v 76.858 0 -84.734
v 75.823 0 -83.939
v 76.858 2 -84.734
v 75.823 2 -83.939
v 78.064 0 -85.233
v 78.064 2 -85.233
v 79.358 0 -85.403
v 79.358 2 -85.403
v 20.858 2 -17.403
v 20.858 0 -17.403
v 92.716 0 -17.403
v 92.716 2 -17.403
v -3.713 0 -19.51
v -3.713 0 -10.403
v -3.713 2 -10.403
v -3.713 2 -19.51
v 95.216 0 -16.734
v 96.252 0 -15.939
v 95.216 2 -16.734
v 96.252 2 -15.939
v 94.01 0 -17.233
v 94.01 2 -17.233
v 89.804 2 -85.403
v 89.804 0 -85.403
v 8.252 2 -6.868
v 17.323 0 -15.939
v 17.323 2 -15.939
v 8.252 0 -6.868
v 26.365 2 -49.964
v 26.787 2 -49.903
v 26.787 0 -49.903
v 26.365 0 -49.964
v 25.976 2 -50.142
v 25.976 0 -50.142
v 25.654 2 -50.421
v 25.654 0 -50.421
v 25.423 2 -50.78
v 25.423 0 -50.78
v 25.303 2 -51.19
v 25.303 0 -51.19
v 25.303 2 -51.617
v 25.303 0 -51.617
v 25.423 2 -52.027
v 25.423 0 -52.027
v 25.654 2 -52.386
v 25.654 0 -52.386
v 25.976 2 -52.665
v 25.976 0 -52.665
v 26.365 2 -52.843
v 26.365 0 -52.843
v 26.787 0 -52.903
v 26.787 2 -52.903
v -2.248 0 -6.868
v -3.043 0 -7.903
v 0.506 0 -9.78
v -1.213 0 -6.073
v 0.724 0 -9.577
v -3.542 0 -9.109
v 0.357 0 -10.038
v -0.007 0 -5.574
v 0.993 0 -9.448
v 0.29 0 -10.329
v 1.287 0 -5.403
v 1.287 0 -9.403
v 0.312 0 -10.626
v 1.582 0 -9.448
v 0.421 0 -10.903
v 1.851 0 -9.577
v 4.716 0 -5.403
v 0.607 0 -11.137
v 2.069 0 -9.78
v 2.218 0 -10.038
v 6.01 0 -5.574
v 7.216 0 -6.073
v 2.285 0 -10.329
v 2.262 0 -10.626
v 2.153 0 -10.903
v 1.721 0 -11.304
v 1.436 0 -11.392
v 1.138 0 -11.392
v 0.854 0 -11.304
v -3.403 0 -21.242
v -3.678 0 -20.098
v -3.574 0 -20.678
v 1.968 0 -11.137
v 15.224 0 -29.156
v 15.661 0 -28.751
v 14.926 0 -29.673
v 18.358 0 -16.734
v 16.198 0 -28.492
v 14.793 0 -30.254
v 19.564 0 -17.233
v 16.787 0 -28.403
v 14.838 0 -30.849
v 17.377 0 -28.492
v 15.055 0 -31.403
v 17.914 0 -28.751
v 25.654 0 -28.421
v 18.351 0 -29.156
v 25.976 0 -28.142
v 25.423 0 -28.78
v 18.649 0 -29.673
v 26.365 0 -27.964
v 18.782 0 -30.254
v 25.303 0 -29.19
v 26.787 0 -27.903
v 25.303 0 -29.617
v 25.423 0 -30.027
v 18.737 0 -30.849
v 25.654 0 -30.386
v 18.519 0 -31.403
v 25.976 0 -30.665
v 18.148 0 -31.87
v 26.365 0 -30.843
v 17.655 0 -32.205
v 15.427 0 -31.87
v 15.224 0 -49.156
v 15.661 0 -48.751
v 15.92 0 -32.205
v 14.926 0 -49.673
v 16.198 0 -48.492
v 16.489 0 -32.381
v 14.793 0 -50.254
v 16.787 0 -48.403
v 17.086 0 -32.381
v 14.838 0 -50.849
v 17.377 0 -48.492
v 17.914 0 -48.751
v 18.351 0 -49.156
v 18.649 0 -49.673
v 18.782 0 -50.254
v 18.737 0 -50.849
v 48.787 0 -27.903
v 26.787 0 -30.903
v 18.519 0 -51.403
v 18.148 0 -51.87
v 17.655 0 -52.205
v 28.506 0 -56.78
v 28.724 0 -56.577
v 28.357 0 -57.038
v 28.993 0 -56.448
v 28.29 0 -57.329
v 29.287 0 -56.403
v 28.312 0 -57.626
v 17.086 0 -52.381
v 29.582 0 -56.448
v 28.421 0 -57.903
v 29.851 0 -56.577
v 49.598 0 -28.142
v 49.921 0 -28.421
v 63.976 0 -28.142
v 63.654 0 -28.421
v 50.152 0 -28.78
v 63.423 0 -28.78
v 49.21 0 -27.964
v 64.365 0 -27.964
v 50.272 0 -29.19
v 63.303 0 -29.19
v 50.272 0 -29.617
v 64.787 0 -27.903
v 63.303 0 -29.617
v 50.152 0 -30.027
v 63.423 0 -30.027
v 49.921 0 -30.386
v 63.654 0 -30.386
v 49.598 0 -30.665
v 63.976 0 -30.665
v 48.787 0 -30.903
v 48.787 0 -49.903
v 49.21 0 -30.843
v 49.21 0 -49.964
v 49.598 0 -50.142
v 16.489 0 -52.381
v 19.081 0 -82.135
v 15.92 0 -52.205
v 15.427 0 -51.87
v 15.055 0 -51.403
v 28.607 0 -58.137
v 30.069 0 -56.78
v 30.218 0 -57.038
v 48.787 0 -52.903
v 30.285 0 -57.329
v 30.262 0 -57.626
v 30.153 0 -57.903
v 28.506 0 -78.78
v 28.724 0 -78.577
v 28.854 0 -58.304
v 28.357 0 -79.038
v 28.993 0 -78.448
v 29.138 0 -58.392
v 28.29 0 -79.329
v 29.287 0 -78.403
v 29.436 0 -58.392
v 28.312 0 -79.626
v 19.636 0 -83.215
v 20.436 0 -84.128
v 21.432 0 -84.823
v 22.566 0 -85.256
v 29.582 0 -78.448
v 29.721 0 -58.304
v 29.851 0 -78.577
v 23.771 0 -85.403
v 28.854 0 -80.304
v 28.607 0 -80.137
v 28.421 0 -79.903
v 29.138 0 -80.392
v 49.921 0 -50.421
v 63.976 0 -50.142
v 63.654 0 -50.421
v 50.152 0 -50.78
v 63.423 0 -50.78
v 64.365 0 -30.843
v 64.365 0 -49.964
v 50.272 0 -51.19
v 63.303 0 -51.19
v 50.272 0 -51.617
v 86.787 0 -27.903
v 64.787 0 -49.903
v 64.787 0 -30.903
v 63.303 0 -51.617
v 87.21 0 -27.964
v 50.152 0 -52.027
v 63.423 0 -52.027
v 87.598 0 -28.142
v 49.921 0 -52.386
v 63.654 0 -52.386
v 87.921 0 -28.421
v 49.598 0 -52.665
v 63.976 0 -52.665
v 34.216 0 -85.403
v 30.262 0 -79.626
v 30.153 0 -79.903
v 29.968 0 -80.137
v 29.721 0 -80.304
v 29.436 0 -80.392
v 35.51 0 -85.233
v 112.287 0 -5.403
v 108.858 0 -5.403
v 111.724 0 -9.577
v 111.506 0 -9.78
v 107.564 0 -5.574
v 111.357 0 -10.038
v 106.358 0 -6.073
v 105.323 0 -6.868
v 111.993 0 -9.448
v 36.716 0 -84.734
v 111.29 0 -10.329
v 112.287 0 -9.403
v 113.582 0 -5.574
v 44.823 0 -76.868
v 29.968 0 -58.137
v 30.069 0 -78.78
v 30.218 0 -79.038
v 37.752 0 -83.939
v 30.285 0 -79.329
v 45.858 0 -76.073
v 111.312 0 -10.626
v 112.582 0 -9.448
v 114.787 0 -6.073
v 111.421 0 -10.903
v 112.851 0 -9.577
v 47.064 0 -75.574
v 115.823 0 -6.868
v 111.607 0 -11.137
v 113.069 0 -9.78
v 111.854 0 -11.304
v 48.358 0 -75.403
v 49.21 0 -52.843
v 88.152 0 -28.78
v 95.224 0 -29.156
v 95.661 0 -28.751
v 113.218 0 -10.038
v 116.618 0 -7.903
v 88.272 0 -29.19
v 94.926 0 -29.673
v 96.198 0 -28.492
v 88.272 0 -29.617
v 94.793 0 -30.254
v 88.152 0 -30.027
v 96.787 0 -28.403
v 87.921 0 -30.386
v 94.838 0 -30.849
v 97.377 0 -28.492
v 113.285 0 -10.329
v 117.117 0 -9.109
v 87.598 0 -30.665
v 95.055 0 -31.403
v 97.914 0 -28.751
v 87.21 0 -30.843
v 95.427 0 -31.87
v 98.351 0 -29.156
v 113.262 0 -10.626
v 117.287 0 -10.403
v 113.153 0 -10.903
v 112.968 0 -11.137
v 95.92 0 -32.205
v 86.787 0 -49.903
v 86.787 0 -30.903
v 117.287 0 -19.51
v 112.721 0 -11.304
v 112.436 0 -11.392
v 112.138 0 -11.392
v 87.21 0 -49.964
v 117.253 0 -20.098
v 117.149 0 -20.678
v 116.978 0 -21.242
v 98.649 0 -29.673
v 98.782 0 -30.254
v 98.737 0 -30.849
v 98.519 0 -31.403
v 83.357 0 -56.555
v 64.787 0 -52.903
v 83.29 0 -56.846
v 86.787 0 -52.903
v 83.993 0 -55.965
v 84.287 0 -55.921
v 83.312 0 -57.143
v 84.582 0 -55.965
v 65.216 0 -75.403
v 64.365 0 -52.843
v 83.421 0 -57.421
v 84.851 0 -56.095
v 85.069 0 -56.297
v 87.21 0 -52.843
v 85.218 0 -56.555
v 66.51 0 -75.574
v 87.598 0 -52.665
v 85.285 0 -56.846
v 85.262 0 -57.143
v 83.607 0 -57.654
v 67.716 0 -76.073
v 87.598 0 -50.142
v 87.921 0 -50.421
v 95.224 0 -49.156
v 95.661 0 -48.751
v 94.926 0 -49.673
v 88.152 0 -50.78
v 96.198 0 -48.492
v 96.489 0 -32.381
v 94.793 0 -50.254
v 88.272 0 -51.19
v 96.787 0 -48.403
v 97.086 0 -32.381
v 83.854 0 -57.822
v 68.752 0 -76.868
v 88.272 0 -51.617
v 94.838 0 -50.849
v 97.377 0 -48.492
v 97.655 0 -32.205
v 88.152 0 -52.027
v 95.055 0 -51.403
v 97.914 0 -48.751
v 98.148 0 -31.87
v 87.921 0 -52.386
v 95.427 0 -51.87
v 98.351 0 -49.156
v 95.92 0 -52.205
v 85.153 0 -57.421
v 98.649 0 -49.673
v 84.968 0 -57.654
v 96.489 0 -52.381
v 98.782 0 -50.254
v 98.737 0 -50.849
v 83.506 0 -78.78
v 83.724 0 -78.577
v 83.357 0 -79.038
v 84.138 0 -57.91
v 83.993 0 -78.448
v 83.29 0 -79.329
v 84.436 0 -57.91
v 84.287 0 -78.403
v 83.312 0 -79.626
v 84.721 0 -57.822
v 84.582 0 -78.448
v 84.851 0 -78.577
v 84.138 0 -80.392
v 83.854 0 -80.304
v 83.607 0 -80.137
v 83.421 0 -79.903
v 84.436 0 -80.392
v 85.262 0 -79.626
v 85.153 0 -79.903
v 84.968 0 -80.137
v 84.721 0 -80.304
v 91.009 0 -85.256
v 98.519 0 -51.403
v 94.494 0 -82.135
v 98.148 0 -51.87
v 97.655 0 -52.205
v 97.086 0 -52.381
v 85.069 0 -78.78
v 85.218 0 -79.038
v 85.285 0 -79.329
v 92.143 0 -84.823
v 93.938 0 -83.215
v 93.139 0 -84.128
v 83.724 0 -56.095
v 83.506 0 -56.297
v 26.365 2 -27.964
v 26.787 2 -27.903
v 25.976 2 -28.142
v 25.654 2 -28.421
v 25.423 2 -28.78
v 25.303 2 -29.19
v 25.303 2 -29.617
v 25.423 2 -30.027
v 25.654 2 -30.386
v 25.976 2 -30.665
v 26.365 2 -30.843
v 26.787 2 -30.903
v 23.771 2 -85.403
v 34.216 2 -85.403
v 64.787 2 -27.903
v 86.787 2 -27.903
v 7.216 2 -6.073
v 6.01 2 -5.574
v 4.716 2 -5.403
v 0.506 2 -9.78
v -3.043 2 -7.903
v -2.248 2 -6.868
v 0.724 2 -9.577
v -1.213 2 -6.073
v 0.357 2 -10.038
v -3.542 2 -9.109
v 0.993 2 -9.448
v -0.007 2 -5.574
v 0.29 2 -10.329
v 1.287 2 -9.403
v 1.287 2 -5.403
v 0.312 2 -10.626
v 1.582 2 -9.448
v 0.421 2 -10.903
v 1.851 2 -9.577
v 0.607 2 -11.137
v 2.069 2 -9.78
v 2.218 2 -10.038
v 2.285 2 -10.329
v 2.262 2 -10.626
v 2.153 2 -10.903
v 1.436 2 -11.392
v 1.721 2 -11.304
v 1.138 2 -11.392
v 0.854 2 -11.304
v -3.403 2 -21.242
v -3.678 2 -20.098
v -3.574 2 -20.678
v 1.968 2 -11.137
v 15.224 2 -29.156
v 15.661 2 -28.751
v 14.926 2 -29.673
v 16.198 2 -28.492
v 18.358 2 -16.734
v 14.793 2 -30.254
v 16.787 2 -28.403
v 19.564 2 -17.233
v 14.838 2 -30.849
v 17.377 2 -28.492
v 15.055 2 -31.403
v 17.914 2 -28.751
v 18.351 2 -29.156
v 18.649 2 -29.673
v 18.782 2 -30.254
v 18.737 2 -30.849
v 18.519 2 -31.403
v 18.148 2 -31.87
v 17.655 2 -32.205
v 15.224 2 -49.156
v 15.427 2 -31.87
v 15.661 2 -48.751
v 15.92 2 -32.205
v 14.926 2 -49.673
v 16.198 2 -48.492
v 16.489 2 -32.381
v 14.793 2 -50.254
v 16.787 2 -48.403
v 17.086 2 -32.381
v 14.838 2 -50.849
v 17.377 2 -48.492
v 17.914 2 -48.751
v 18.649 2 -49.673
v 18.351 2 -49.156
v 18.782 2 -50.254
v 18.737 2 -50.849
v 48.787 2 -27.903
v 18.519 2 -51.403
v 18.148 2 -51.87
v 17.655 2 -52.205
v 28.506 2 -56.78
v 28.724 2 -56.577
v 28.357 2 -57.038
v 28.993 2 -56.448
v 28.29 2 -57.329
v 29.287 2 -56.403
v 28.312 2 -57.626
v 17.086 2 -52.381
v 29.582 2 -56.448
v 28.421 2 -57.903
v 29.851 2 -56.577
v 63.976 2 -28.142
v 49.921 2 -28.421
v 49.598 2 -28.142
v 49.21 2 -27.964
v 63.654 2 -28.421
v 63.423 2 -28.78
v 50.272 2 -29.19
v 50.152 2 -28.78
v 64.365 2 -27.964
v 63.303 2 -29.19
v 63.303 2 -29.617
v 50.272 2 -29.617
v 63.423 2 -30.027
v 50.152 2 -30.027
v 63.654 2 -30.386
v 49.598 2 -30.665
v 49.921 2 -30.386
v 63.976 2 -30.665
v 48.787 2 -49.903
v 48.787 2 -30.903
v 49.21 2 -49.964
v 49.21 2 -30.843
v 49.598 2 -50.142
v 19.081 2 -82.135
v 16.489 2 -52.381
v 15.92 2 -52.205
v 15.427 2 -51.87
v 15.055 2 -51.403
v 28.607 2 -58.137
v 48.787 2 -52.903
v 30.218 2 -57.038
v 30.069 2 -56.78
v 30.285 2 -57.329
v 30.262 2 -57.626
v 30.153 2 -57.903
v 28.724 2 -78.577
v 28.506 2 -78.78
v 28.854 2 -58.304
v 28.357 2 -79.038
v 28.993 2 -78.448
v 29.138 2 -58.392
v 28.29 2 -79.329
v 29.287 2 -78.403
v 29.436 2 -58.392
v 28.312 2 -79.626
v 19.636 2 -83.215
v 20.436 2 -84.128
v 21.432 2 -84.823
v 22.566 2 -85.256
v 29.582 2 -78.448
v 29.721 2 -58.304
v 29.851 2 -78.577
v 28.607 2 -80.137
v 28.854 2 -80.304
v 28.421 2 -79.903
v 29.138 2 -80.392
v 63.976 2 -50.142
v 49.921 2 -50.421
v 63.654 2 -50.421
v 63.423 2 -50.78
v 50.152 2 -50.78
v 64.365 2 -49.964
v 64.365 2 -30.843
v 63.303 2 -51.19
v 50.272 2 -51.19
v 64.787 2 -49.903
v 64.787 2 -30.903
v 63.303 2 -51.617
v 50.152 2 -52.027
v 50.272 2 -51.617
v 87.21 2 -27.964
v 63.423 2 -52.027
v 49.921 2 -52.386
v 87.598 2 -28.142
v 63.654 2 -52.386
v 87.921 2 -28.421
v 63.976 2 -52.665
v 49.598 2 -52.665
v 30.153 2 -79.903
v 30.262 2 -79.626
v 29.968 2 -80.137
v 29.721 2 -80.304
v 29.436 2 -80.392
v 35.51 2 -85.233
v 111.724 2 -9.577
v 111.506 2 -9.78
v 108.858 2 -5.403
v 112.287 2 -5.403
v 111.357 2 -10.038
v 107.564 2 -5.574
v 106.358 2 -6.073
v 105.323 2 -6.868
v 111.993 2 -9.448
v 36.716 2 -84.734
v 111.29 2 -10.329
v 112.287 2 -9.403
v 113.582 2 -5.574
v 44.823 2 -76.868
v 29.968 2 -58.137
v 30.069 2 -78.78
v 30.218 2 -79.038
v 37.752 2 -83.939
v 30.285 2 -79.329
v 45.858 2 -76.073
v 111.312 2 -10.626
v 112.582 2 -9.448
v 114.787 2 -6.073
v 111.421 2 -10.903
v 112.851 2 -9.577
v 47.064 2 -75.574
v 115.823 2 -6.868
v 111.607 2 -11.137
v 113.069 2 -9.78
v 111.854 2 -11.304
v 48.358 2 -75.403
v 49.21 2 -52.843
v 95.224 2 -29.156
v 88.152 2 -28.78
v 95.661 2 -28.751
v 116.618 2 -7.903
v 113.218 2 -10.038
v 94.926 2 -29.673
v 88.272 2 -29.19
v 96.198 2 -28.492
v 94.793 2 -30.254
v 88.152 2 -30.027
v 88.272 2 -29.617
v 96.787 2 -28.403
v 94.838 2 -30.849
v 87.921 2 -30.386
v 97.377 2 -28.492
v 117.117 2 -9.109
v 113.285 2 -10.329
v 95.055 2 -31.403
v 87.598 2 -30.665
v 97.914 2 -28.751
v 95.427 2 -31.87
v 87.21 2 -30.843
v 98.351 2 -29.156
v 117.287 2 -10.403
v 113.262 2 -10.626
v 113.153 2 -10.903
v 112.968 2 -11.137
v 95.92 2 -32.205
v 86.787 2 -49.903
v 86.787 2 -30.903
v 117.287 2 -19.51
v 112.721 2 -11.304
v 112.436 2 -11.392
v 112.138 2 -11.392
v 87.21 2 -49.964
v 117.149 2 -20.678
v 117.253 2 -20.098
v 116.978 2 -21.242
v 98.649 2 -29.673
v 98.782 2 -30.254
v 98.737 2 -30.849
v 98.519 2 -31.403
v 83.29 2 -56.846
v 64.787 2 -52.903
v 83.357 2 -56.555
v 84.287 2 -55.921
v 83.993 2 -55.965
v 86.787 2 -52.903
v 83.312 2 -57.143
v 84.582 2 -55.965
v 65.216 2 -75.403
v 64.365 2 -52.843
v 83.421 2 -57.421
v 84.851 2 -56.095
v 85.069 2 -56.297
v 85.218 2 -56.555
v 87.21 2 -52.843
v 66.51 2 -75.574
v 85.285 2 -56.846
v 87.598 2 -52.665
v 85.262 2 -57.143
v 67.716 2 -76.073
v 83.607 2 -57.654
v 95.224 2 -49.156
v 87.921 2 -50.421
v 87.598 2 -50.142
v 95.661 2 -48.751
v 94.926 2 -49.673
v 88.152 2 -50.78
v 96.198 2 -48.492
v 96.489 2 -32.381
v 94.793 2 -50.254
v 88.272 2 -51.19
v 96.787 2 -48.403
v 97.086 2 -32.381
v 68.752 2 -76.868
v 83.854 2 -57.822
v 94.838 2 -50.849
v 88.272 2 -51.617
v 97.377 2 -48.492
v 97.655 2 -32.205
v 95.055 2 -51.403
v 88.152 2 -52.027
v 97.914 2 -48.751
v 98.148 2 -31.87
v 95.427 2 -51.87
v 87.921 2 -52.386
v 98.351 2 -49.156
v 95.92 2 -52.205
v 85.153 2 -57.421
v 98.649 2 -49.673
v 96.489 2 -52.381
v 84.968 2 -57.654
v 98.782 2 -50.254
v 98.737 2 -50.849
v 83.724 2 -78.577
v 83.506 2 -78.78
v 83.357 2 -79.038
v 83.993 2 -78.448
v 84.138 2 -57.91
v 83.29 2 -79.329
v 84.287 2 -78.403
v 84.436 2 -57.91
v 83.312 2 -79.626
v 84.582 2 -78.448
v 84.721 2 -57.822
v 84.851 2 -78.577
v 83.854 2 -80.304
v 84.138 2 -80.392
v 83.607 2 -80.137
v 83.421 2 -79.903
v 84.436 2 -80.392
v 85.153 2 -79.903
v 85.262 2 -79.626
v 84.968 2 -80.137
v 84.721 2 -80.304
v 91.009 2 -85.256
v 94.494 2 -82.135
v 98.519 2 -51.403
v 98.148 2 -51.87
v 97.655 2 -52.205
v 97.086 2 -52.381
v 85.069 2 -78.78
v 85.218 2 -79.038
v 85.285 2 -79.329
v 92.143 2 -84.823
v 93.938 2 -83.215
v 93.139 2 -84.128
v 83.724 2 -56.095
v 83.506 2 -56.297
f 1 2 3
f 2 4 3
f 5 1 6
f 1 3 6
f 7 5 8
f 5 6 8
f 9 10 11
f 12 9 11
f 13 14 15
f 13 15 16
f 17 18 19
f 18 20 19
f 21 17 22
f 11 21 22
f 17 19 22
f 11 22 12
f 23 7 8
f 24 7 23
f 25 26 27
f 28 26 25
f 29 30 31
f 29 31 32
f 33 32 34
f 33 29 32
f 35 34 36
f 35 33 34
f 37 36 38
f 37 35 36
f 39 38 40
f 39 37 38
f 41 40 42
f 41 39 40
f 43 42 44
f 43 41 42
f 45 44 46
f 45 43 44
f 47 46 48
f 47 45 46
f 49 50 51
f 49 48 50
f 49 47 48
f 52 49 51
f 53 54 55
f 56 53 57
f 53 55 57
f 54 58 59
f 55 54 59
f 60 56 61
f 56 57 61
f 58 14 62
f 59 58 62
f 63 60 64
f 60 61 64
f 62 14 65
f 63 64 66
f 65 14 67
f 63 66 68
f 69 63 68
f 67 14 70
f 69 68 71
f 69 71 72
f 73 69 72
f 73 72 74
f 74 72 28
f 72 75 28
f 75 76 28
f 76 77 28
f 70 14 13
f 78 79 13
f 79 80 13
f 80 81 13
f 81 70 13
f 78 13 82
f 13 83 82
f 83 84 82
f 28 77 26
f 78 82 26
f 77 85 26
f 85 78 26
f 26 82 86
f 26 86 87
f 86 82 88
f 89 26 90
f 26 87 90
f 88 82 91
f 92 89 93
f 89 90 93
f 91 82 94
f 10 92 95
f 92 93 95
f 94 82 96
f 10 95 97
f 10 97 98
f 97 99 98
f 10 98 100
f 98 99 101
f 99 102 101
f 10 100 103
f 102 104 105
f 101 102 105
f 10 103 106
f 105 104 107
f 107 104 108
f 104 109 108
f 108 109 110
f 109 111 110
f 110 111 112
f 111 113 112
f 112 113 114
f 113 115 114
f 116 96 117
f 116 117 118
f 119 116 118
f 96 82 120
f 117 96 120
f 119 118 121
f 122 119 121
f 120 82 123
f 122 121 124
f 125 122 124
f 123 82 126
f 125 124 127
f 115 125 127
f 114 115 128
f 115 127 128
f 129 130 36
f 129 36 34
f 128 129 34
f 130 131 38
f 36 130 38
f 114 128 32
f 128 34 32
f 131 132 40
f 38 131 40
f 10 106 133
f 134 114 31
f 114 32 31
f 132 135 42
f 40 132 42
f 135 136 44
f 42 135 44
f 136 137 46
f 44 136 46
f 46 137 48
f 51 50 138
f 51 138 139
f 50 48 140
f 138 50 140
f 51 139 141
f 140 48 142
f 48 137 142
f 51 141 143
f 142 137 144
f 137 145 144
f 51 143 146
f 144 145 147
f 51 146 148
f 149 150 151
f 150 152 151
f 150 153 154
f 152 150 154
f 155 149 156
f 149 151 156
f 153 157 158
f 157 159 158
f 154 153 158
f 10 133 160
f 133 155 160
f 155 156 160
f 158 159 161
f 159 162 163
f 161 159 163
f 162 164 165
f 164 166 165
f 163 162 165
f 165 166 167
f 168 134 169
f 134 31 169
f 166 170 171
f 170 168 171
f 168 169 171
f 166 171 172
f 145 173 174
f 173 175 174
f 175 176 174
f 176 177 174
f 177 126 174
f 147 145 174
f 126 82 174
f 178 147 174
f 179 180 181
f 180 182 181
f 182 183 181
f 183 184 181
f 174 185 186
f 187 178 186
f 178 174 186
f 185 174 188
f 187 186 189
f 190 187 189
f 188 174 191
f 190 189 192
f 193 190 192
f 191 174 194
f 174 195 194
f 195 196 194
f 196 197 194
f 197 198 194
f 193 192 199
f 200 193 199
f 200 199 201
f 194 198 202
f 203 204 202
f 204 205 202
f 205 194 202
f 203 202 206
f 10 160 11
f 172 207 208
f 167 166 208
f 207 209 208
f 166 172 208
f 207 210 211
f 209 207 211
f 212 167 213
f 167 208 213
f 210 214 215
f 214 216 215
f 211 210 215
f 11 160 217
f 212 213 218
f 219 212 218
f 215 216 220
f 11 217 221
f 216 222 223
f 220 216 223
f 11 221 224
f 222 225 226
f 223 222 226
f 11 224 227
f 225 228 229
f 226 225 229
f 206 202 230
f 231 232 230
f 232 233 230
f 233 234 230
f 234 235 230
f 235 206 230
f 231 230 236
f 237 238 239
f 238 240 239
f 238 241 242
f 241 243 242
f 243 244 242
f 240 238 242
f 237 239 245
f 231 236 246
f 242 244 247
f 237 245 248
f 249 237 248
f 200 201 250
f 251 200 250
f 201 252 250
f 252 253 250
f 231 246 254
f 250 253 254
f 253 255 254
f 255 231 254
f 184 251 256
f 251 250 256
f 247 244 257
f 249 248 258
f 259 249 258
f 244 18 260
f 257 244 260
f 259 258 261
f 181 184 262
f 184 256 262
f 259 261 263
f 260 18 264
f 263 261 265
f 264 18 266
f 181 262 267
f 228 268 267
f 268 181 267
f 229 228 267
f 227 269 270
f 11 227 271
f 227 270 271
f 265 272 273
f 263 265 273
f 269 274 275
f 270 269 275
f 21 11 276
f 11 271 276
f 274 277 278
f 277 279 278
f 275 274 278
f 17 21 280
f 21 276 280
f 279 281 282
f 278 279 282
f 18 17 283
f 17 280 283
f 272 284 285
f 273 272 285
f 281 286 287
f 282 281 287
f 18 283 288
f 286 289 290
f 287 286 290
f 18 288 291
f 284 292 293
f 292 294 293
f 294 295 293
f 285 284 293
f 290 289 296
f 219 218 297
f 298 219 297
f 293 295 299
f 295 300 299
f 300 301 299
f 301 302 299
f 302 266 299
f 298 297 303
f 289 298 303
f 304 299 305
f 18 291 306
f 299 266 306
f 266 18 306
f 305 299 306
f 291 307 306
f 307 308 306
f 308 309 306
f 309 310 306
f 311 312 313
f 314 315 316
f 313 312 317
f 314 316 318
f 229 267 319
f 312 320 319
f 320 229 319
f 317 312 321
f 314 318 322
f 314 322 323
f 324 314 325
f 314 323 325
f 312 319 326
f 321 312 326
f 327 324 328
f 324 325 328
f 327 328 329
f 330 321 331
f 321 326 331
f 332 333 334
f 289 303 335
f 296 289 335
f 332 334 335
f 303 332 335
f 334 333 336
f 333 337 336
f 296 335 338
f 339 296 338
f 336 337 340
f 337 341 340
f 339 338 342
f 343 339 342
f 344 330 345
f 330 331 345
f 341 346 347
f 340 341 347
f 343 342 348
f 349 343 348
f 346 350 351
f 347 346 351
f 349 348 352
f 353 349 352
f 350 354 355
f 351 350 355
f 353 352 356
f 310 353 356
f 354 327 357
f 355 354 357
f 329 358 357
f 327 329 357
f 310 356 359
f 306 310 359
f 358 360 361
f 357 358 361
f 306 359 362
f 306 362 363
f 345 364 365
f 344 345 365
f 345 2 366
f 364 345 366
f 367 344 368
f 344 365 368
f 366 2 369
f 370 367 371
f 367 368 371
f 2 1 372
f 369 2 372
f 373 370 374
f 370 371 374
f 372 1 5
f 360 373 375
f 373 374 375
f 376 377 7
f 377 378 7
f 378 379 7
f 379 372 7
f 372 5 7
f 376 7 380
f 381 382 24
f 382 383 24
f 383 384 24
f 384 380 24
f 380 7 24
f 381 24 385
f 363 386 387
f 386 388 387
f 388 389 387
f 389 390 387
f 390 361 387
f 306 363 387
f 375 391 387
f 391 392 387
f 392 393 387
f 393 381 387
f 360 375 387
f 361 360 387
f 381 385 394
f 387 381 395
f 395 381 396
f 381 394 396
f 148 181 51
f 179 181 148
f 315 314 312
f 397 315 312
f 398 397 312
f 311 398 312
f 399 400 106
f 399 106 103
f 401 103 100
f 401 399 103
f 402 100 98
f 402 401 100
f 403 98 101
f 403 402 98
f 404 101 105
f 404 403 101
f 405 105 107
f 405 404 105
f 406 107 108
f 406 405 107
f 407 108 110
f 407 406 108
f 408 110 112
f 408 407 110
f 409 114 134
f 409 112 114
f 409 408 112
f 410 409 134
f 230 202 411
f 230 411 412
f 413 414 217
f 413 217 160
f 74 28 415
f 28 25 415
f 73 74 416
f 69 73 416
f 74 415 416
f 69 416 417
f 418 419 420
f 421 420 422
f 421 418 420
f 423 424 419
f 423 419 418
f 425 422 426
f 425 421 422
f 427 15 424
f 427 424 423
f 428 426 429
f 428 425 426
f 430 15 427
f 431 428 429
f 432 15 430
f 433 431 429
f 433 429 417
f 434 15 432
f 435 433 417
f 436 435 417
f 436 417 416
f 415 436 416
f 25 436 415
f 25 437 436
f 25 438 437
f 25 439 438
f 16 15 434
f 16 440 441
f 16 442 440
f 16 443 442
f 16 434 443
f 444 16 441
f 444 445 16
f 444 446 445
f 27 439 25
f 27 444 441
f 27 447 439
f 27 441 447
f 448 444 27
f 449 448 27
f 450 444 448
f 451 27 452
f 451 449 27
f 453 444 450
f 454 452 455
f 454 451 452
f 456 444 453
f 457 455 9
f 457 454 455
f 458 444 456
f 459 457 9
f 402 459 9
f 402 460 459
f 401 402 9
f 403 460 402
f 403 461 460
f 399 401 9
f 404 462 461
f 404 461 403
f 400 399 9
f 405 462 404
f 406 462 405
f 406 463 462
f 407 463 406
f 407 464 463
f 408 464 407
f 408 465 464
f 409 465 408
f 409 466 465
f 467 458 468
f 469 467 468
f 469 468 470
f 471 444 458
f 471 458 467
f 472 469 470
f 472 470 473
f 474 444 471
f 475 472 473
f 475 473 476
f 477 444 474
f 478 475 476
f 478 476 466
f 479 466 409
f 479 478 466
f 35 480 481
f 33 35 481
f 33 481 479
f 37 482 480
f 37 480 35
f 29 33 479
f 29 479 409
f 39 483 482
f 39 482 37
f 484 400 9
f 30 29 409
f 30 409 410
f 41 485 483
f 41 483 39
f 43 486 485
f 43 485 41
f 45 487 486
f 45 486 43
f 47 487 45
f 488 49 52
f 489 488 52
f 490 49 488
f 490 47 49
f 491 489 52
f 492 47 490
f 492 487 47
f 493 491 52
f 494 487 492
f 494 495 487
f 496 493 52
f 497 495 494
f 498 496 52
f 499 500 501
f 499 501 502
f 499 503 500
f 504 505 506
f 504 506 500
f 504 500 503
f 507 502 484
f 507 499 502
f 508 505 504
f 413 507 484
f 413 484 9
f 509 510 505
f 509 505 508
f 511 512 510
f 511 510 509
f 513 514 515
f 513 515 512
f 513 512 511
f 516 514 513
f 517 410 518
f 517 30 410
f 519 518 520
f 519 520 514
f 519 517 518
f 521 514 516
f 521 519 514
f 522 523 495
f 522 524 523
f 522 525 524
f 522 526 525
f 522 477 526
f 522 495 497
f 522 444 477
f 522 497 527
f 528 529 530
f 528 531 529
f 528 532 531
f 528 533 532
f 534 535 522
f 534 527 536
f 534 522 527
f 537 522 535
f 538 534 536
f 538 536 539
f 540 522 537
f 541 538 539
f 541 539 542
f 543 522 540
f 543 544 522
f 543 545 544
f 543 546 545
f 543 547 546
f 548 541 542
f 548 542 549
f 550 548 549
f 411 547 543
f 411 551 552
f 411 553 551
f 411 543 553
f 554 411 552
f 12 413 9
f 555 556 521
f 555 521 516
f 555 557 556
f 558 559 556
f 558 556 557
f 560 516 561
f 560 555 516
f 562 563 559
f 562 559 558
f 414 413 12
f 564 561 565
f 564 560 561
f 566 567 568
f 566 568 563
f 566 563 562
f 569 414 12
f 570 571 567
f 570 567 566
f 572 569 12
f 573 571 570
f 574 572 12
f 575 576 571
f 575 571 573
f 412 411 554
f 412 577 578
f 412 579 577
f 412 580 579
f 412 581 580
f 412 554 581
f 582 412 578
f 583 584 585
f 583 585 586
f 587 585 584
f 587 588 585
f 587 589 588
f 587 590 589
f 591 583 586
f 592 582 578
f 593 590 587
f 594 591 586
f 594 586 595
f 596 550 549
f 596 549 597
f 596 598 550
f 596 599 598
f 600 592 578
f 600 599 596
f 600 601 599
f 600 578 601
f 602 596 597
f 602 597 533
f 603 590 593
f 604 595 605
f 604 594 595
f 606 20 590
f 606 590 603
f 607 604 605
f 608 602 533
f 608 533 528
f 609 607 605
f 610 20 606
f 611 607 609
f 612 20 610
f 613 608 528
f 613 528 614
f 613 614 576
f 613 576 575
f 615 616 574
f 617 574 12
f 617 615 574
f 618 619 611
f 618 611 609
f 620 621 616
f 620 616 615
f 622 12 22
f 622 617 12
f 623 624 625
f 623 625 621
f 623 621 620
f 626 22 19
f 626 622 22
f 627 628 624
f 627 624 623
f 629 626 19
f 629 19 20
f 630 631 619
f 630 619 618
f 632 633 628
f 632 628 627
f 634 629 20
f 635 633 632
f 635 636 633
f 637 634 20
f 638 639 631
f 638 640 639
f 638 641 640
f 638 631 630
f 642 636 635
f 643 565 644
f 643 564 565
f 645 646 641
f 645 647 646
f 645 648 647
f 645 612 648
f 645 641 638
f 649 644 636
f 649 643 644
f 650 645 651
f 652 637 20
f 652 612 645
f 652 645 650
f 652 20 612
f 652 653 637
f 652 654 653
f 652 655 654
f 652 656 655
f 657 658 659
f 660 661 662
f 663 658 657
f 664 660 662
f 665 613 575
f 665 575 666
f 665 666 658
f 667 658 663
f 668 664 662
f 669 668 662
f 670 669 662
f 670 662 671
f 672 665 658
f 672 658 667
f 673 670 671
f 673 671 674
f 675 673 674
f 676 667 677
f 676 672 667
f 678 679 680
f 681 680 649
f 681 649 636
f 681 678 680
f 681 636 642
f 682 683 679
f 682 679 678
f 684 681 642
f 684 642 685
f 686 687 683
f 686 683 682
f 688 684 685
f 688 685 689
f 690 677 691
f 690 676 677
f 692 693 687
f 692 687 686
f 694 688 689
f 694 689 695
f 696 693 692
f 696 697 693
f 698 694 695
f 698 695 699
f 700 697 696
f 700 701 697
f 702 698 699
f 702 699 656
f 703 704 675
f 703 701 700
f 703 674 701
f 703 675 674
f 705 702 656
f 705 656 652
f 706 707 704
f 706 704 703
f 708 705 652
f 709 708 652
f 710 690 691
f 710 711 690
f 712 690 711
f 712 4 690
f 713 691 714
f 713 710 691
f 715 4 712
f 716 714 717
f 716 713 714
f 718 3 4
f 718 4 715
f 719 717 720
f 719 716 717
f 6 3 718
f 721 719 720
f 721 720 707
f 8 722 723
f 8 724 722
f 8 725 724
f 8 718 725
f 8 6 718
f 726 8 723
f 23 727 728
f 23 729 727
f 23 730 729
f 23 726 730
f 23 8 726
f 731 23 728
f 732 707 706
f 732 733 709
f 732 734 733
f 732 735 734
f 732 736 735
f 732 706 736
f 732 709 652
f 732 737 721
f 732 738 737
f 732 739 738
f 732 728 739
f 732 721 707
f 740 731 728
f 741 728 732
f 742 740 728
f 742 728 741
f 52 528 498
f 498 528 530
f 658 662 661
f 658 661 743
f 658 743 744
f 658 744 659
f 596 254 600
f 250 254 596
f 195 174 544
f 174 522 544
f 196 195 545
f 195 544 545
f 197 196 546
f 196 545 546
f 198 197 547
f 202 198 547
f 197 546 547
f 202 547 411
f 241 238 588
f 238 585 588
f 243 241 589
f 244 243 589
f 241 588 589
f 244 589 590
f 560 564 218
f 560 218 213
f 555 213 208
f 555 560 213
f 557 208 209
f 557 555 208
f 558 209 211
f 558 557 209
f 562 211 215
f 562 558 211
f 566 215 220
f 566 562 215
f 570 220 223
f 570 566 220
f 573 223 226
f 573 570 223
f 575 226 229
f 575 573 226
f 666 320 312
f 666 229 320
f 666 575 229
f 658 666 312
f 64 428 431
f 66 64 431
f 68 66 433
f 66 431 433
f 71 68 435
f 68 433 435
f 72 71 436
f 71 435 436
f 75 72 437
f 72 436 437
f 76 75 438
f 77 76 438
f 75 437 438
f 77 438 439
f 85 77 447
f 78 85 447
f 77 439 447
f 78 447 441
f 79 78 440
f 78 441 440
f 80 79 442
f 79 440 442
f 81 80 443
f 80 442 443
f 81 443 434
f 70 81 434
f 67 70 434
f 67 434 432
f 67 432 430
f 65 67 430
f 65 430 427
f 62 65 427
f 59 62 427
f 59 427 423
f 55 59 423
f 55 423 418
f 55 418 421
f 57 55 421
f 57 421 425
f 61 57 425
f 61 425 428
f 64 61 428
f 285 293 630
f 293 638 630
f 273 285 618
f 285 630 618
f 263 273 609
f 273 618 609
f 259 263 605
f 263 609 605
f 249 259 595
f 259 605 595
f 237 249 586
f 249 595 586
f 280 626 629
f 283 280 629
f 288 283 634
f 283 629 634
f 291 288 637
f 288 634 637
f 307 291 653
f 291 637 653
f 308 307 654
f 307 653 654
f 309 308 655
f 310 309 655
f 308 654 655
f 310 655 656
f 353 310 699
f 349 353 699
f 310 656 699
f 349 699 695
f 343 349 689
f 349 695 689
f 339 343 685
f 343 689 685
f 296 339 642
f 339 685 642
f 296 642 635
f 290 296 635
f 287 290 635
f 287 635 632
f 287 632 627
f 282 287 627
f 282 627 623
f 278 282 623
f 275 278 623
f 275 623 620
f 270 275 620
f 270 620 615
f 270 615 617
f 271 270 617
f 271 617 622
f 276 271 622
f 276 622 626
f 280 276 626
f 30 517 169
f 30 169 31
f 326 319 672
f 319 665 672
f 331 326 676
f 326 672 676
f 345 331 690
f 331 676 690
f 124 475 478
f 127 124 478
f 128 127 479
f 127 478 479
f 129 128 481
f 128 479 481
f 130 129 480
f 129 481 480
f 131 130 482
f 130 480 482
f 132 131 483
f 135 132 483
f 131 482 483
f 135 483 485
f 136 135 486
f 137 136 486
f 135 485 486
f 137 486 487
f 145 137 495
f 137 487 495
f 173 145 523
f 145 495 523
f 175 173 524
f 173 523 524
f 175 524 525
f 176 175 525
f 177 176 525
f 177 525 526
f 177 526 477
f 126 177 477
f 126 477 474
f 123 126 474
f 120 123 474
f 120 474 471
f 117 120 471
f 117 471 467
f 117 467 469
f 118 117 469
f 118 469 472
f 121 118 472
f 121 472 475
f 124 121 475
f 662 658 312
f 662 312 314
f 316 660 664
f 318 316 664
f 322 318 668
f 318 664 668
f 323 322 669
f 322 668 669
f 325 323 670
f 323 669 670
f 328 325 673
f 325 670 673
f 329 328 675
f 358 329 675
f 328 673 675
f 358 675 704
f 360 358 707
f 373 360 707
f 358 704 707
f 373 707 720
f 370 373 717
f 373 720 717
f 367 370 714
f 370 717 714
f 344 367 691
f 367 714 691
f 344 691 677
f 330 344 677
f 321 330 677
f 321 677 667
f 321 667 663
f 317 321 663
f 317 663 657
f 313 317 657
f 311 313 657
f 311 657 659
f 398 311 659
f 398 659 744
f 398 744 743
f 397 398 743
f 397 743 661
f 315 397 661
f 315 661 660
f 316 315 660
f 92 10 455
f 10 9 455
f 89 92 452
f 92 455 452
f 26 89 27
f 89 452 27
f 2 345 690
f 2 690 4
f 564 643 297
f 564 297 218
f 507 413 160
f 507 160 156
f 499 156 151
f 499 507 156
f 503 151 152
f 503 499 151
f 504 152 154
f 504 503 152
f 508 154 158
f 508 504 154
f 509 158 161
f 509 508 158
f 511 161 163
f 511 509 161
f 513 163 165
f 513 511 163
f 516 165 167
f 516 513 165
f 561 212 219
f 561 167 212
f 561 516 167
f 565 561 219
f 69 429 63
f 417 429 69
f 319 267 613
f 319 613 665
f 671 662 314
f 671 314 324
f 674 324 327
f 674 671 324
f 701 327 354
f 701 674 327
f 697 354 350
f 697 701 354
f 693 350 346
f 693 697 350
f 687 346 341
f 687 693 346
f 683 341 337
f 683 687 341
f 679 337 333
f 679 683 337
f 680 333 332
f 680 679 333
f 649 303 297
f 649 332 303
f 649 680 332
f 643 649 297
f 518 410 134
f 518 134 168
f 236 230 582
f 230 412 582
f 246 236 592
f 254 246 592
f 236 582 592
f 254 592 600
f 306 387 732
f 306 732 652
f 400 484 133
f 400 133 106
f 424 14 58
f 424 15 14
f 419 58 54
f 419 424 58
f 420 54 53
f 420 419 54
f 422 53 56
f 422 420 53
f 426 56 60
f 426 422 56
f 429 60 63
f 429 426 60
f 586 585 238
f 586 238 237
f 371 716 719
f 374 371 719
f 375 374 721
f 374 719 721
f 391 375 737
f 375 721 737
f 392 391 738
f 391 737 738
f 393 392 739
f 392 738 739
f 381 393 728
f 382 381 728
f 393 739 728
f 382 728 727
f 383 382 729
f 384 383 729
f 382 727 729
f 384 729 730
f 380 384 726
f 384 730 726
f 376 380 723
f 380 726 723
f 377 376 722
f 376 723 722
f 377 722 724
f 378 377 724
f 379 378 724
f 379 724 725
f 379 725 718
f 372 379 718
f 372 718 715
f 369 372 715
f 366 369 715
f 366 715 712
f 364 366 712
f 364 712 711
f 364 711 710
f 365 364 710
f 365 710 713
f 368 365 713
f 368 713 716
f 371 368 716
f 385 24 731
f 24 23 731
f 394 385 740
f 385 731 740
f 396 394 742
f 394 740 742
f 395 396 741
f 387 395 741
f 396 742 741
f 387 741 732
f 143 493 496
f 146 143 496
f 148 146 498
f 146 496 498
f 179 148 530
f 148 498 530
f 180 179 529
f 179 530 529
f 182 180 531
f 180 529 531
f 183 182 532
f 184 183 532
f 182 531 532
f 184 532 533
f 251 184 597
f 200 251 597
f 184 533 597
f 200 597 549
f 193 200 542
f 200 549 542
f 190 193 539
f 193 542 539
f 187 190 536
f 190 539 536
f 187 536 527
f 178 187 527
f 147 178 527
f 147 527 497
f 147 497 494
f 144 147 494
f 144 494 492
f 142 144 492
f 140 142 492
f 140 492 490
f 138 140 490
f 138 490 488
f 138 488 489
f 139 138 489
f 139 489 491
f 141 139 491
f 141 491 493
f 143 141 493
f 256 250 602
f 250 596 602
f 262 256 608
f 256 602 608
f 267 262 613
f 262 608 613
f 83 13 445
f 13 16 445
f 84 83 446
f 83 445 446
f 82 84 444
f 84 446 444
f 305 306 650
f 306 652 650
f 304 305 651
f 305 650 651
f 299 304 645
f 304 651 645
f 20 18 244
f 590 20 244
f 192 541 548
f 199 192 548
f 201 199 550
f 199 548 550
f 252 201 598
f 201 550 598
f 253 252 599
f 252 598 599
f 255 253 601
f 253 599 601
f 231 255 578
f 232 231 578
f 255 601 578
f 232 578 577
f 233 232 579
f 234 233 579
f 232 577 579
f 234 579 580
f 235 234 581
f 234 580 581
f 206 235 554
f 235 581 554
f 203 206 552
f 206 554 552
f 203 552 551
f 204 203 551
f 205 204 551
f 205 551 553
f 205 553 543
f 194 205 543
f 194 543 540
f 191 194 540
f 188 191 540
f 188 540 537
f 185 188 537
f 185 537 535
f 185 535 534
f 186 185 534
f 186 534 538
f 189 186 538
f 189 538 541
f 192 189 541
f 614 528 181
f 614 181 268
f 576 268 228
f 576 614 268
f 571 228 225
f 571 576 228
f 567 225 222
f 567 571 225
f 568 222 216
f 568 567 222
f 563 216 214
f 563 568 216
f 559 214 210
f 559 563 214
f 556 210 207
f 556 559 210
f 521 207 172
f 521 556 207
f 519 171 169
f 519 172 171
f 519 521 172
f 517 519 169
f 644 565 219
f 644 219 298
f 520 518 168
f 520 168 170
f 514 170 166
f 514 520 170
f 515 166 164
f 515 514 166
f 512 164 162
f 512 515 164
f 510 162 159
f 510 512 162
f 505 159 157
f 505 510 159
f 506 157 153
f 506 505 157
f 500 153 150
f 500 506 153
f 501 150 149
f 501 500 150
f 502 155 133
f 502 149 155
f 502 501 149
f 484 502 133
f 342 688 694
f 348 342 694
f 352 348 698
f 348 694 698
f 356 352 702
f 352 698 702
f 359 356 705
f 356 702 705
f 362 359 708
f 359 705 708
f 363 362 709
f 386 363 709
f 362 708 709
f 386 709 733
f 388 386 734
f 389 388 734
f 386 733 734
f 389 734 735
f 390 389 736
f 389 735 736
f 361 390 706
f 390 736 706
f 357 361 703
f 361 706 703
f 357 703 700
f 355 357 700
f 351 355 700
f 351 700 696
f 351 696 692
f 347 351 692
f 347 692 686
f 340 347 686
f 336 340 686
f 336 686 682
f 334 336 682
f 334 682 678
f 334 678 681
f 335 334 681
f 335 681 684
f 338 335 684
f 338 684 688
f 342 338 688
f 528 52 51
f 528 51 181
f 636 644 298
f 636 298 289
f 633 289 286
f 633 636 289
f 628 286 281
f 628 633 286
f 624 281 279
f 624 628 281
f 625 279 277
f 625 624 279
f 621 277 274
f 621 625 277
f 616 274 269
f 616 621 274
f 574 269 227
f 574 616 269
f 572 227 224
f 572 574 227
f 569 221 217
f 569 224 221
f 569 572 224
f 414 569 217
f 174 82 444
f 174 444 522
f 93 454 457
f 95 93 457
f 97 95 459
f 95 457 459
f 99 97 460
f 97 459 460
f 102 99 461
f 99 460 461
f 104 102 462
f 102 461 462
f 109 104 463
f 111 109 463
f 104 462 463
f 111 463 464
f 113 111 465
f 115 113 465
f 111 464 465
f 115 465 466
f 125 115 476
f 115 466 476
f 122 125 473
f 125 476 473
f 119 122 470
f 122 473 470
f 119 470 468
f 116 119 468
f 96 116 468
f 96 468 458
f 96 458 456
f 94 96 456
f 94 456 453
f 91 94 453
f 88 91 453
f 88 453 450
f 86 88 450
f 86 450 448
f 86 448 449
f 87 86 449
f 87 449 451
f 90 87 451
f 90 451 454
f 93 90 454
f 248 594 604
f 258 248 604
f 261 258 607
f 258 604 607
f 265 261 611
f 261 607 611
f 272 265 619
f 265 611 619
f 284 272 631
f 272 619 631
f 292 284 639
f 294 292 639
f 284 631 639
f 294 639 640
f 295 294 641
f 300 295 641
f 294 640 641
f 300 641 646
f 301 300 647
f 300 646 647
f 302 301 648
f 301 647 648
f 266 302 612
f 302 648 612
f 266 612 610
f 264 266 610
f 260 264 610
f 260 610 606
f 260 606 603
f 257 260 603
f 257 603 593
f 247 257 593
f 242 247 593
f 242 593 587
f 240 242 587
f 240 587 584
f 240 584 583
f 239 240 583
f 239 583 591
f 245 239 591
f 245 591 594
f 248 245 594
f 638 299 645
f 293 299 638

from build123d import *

# Parameters (mm, degrees)
SKETCH1_W                = 130
SKETCH1_H                = 90
BOSS_EXTRUDE2_DEPTH      = 2
SKETCH2_R                = 2
CUT_EXTRUDE1_DEPTH       = 10
CUT_EXTRUDE3_DEPTH       = 10
SKETCH5_R                = 1
CUT_EXTRUDE4_DEPTH       = 10
SKETCH7_W                = 130
SKETCH7_H                = 10
CUT_EXTRUDE5_DEPTH       = 10
CUT_EXTRUDE10_DEPTH      = 149.761308663
CUT_EXTRUDE10_DEPTH_BACK = 149.761308663
CUT_EXTRUDE14_DEPTH      = 149.761308663
CUT_EXTRUDE14_DEPTH_BACK = 13
SKETCH12_R               = 1
FILLET2_R                = 5


with BuildPart() as part:
    # Sketch1 → Boss-Extrude2 (new body)
    with BuildSketch(Plane(origin=(0, 0, 0), x_dir=(1, 0, 0), z_dir=(0, 1, 0))):
        with Locations((56.787418592, 40.403463793)):
            Rectangle(SKETCH1_W, SKETCH1_H)
    extrude(amount=BOSS_EXTRUDE2_DEPTH)

    # Sketch2 → Cut-Extrude1 (cut)
    with BuildSketch(Plane(origin=(0, 2, 0), x_dir=(1, 0, 0), z_dir=(0, 1, 0))):
        with Locations(Location((16.787418592, 50.403463793, 0), (0, 0, 270))):
            Circle(SKETCH2_R)
        with Locations(Location((16.787418592, 30.403463793, 0), (0, 0, 270))):
            Circle(SKETCH2_R)
        with Locations(Location((96.787418592, 50.403463793, 0), (0, 0, 270))):
            Circle(SKETCH2_R)
        with Locations(Location((96.787418592, 30.403463793, 0), (0, 0, 270))):
            Circle(SKETCH2_R)
    extrude(amount=-CUT_EXTRUDE1_DEPTH, mode=Mode.SUBTRACT)

    # Sketch4 → Cut-Extrude3 (cut)
    with BuildSketch(Plane(origin=(0, 2, 0), x_dir=(1, 0, 0), z_dir=(0, 1, 0))):
        with BuildLine():
            Line((26.787418592, 52.903463793), (48.787418592, 52.903463793))
            ThreePointArc((48.787418592, 52.903463793), (50.287418592, 51.403463793), (48.787418592, 49.903463793))
            Line((48.787418592, 49.903463793), (26.787418592, 49.903463793))
            ThreePointArc((26.787418592, 49.903463793), (25.287418592, 51.403463793), (26.787418592, 52.903463793))
        make_face()
        with BuildLine():
            Line((26.787418592, 30.903463793), (48.787418592, 30.903463793))
            ThreePointArc((48.787418592, 30.903463793), (50.287418592, 29.403463793), (48.787418592, 27.903463793))
            Line((48.787418592, 27.903463793), (26.787418592, 27.903463793))
            ThreePointArc((26.787418592, 27.903463793), (25.287418592, 29.403463793), (26.787418592, 30.903463793))
        make_face()
        with BuildLine():
            Line((64.787418592, 52.903463793), (86.787418592, 52.903463793))
            ThreePointArc((86.787418592, 52.903463793), (88.287418592, 51.403463793), (86.787418592, 49.903463793))
            Line((86.787418592, 49.903463793), (64.787418592, 49.903463793))
            ThreePointArc((64.787418592, 49.903463793), (63.287418592, 51.403463793), (64.787418592, 52.903463793))
        make_face()
        with BuildLine():
            Line((64.787418592, 30.903463793), (86.787418592, 30.903463793))
            ThreePointArc((86.787418592, 30.903463793), (88.287418592, 29.403463793), (86.787418592, 27.903463793))
            Line((86.787418592, 27.903463793), (64.787418592, 27.903463793))
            ThreePointArc((64.787418592, 27.903463793), (63.287418592, 29.403463793), (64.787418592, 30.903463793))
        make_face()
    extrude(amount=-CUT_EXTRUDE3_DEPTH, mode=Mode.SUBTRACT)

    # Sketch5 → Cut-Extrude4 (cut)
    with BuildSketch(Plane(origin=(0, 2, 0), x_dir=(1, 0, 0), z_dir=(0, 1, 0))):
        with Locations(Location((1.287418592, 10.403463793, 0), (0, 0, 270))):
            Circle(SKETCH5_R)
        with Locations(Location((112.287418592, 10.403463793, 0), (0, 0, 270))):
            Circle(SKETCH5_R)
        with Locations(Location((84.287418592, 56.920801797, 0), (0, 0, 270))):
            Circle(SKETCH5_R)
        with Locations(Location((116.787418592, 57.403463793, 0), (0, 0, 270))):
            Circle(SKETCH5_R)
        with Locations(Location((116.787418592, 79.403463793, 0), (0, 0, 270))):
            Circle(SKETCH5_R)
        with Locations(Location((84.287418592, 79.403463793, 0), (0, 0, 270))):
            Circle(SKETCH5_R)
        with Locations(Location((-3.212581408, 57.403463793, 0), (0, 0, 270))):
            Circle(SKETCH5_R)
        with Locations(Location((29.287418592, 57.403463793, 0), (0, 0, 270))):
            Circle(SKETCH5_R)
        with Locations(Location((29.287418592, 79.403463793, 0), (0, 0, 270))):
            Circle(SKETCH5_R)
        with Locations(Location((-3.212581408, 79.403463793, 0), (0, 0, 270))):
            Circle(SKETCH5_R)
    extrude(amount=-CUT_EXTRUDE4_DEPTH, mode=Mode.SUBTRACT)

    # Sketch7 → Cut-Extrude5 (cut)
    with BuildSketch(Plane(origin=(0, 2, 0), x_dir=(1, 0, 0), z_dir=(0, 1, 0))):
        with Locations((56.787418592, 0.403463793)):
            Rectangle(SKETCH7_W, SKETCH7_H)
    extrude(amount=-CUT_EXTRUDE5_DEPTH, mode=Mode.SUBTRACT)

    # Sketch9 → Cut-Extrude10 (cut, two sides: drawn at the far end of the back side and taken through both)
    with BuildSketch(Plane(origin=(0, 2, 0), x_dir=(1, 0, 0), z_dir=(0, 1, 0)).offset(-CUT_EXTRUDE10_DEPTH_BACK)):
        Polygon((-198.399776781, -199.78373158), (6.787418592, 5.403463793), (18.787418592, 17.403463793), (94.787418592, 17.403463793), (106.787418592, 5.403463793), (311.974613966, -199.78373158), (311.974613966, -780.140760625), (-198.399776781, -780.140760625), align=None)
    extrude(amount=CUT_EXTRUDE10_DEPTH + CUT_EXTRUDE10_DEPTH_BACK, mode=Mode.SUBTRACT)

    # Sketch12 → Cut-Extrude14 (cut, two sides: drawn at the far end of the back side and taken through both)
    # profile 1 of 3: a face of its own
    with BuildSketch(Plane(origin=(0, 2, 0), x_dir=(1, 0, 0), z_dir=(0, 1, 0)).offset(-CUT_EXTRUDE14_DEPTH_BACK)):
        Polygon((-8.212581408, 5.403463793), (-3.712581408, 5.403463793), (-3.712581408, 20.403463793), (20.287418592, 85.403463793), (-8.212581408, 85.403463793), align=None)
        with Locations((-3.212581408, 57.403463793)):
            Circle(SKETCH12_R, mode=Mode.SUBTRACT)
        with Locations((-3.212581408, 79.403463793)):
            Circle(SKETCH12_R, mode=Mode.SUBTRACT)
    # profile 2 of 3: a face of its own
    with BuildSketch(Plane(origin=(0, 2, 0), x_dir=(1, 0, 0), z_dir=(0, 1, 0)).offset(-CUT_EXTRUDE14_DEPTH_BACK)):
        Polygon((77.287418592, 85.403463793), (36.287418592, 85.403463793), (46.287418592, 75.403463793), (67.287418592, 75.403463793), align=None)
    # profile 3 of 3: a face of its own
    with BuildSketch(Plane(origin=(0, 2, 0), x_dir=(1, 0, 0), z_dir=(0, 1, 0)).offset(-CUT_EXTRUDE14_DEPTH_BACK)):
        Polygon((121.787418592, 85.403463793), (93.287418592, 85.403463793), (117.287418592, 20.403463793), (117.287418592, 5.403463793), (121.787418592, 5.403463793), align=None)
        with Locations((116.787418592, 57.403463793)):
            Circle(SKETCH12_R, mode=Mode.SUBTRACT)
        with Locations((116.787418592, 79.403463793)):
            Circle(SKETCH12_R, mode=Mode.SUBTRACT)
    extrude(amount=CUT_EXTRUDE14_DEPTH + CUT_EXTRUDE14_DEPTH_BACK, mode=Mode.SUBTRACT)

    # Fillet2
    fillet2_edges = [part.edges().sort_by_distance(p)[0] for p in [
        (-3.712581408, 1, -5.403463793),
        (-3.712581408, 1, -20.403463793),
        (18.787418592, 1, -17.403463793),
        (6.787418592, 1, -5.403463793),
        (94.787418592, 1, -17.403463793),
        (106.787418592, 1, -5.403463793),
        (117.287418592, 1, -5.403463793),
        (117.287418592, 1, -20.403463793),
        (93.287418592, 1, -85.403463793),
        (20.287418592, 1, -85.403463793),
        (36.287418592, 1, -85.403463793),
        (46.287418592, 1, -75.403463793),
        (67.287418592, 1, -75.403463793),
        (77.287418592, 1, -85.403463793),
    ]]
    fillet(fillet2_edges, radius=FILLET2_R)


solid = part.part
